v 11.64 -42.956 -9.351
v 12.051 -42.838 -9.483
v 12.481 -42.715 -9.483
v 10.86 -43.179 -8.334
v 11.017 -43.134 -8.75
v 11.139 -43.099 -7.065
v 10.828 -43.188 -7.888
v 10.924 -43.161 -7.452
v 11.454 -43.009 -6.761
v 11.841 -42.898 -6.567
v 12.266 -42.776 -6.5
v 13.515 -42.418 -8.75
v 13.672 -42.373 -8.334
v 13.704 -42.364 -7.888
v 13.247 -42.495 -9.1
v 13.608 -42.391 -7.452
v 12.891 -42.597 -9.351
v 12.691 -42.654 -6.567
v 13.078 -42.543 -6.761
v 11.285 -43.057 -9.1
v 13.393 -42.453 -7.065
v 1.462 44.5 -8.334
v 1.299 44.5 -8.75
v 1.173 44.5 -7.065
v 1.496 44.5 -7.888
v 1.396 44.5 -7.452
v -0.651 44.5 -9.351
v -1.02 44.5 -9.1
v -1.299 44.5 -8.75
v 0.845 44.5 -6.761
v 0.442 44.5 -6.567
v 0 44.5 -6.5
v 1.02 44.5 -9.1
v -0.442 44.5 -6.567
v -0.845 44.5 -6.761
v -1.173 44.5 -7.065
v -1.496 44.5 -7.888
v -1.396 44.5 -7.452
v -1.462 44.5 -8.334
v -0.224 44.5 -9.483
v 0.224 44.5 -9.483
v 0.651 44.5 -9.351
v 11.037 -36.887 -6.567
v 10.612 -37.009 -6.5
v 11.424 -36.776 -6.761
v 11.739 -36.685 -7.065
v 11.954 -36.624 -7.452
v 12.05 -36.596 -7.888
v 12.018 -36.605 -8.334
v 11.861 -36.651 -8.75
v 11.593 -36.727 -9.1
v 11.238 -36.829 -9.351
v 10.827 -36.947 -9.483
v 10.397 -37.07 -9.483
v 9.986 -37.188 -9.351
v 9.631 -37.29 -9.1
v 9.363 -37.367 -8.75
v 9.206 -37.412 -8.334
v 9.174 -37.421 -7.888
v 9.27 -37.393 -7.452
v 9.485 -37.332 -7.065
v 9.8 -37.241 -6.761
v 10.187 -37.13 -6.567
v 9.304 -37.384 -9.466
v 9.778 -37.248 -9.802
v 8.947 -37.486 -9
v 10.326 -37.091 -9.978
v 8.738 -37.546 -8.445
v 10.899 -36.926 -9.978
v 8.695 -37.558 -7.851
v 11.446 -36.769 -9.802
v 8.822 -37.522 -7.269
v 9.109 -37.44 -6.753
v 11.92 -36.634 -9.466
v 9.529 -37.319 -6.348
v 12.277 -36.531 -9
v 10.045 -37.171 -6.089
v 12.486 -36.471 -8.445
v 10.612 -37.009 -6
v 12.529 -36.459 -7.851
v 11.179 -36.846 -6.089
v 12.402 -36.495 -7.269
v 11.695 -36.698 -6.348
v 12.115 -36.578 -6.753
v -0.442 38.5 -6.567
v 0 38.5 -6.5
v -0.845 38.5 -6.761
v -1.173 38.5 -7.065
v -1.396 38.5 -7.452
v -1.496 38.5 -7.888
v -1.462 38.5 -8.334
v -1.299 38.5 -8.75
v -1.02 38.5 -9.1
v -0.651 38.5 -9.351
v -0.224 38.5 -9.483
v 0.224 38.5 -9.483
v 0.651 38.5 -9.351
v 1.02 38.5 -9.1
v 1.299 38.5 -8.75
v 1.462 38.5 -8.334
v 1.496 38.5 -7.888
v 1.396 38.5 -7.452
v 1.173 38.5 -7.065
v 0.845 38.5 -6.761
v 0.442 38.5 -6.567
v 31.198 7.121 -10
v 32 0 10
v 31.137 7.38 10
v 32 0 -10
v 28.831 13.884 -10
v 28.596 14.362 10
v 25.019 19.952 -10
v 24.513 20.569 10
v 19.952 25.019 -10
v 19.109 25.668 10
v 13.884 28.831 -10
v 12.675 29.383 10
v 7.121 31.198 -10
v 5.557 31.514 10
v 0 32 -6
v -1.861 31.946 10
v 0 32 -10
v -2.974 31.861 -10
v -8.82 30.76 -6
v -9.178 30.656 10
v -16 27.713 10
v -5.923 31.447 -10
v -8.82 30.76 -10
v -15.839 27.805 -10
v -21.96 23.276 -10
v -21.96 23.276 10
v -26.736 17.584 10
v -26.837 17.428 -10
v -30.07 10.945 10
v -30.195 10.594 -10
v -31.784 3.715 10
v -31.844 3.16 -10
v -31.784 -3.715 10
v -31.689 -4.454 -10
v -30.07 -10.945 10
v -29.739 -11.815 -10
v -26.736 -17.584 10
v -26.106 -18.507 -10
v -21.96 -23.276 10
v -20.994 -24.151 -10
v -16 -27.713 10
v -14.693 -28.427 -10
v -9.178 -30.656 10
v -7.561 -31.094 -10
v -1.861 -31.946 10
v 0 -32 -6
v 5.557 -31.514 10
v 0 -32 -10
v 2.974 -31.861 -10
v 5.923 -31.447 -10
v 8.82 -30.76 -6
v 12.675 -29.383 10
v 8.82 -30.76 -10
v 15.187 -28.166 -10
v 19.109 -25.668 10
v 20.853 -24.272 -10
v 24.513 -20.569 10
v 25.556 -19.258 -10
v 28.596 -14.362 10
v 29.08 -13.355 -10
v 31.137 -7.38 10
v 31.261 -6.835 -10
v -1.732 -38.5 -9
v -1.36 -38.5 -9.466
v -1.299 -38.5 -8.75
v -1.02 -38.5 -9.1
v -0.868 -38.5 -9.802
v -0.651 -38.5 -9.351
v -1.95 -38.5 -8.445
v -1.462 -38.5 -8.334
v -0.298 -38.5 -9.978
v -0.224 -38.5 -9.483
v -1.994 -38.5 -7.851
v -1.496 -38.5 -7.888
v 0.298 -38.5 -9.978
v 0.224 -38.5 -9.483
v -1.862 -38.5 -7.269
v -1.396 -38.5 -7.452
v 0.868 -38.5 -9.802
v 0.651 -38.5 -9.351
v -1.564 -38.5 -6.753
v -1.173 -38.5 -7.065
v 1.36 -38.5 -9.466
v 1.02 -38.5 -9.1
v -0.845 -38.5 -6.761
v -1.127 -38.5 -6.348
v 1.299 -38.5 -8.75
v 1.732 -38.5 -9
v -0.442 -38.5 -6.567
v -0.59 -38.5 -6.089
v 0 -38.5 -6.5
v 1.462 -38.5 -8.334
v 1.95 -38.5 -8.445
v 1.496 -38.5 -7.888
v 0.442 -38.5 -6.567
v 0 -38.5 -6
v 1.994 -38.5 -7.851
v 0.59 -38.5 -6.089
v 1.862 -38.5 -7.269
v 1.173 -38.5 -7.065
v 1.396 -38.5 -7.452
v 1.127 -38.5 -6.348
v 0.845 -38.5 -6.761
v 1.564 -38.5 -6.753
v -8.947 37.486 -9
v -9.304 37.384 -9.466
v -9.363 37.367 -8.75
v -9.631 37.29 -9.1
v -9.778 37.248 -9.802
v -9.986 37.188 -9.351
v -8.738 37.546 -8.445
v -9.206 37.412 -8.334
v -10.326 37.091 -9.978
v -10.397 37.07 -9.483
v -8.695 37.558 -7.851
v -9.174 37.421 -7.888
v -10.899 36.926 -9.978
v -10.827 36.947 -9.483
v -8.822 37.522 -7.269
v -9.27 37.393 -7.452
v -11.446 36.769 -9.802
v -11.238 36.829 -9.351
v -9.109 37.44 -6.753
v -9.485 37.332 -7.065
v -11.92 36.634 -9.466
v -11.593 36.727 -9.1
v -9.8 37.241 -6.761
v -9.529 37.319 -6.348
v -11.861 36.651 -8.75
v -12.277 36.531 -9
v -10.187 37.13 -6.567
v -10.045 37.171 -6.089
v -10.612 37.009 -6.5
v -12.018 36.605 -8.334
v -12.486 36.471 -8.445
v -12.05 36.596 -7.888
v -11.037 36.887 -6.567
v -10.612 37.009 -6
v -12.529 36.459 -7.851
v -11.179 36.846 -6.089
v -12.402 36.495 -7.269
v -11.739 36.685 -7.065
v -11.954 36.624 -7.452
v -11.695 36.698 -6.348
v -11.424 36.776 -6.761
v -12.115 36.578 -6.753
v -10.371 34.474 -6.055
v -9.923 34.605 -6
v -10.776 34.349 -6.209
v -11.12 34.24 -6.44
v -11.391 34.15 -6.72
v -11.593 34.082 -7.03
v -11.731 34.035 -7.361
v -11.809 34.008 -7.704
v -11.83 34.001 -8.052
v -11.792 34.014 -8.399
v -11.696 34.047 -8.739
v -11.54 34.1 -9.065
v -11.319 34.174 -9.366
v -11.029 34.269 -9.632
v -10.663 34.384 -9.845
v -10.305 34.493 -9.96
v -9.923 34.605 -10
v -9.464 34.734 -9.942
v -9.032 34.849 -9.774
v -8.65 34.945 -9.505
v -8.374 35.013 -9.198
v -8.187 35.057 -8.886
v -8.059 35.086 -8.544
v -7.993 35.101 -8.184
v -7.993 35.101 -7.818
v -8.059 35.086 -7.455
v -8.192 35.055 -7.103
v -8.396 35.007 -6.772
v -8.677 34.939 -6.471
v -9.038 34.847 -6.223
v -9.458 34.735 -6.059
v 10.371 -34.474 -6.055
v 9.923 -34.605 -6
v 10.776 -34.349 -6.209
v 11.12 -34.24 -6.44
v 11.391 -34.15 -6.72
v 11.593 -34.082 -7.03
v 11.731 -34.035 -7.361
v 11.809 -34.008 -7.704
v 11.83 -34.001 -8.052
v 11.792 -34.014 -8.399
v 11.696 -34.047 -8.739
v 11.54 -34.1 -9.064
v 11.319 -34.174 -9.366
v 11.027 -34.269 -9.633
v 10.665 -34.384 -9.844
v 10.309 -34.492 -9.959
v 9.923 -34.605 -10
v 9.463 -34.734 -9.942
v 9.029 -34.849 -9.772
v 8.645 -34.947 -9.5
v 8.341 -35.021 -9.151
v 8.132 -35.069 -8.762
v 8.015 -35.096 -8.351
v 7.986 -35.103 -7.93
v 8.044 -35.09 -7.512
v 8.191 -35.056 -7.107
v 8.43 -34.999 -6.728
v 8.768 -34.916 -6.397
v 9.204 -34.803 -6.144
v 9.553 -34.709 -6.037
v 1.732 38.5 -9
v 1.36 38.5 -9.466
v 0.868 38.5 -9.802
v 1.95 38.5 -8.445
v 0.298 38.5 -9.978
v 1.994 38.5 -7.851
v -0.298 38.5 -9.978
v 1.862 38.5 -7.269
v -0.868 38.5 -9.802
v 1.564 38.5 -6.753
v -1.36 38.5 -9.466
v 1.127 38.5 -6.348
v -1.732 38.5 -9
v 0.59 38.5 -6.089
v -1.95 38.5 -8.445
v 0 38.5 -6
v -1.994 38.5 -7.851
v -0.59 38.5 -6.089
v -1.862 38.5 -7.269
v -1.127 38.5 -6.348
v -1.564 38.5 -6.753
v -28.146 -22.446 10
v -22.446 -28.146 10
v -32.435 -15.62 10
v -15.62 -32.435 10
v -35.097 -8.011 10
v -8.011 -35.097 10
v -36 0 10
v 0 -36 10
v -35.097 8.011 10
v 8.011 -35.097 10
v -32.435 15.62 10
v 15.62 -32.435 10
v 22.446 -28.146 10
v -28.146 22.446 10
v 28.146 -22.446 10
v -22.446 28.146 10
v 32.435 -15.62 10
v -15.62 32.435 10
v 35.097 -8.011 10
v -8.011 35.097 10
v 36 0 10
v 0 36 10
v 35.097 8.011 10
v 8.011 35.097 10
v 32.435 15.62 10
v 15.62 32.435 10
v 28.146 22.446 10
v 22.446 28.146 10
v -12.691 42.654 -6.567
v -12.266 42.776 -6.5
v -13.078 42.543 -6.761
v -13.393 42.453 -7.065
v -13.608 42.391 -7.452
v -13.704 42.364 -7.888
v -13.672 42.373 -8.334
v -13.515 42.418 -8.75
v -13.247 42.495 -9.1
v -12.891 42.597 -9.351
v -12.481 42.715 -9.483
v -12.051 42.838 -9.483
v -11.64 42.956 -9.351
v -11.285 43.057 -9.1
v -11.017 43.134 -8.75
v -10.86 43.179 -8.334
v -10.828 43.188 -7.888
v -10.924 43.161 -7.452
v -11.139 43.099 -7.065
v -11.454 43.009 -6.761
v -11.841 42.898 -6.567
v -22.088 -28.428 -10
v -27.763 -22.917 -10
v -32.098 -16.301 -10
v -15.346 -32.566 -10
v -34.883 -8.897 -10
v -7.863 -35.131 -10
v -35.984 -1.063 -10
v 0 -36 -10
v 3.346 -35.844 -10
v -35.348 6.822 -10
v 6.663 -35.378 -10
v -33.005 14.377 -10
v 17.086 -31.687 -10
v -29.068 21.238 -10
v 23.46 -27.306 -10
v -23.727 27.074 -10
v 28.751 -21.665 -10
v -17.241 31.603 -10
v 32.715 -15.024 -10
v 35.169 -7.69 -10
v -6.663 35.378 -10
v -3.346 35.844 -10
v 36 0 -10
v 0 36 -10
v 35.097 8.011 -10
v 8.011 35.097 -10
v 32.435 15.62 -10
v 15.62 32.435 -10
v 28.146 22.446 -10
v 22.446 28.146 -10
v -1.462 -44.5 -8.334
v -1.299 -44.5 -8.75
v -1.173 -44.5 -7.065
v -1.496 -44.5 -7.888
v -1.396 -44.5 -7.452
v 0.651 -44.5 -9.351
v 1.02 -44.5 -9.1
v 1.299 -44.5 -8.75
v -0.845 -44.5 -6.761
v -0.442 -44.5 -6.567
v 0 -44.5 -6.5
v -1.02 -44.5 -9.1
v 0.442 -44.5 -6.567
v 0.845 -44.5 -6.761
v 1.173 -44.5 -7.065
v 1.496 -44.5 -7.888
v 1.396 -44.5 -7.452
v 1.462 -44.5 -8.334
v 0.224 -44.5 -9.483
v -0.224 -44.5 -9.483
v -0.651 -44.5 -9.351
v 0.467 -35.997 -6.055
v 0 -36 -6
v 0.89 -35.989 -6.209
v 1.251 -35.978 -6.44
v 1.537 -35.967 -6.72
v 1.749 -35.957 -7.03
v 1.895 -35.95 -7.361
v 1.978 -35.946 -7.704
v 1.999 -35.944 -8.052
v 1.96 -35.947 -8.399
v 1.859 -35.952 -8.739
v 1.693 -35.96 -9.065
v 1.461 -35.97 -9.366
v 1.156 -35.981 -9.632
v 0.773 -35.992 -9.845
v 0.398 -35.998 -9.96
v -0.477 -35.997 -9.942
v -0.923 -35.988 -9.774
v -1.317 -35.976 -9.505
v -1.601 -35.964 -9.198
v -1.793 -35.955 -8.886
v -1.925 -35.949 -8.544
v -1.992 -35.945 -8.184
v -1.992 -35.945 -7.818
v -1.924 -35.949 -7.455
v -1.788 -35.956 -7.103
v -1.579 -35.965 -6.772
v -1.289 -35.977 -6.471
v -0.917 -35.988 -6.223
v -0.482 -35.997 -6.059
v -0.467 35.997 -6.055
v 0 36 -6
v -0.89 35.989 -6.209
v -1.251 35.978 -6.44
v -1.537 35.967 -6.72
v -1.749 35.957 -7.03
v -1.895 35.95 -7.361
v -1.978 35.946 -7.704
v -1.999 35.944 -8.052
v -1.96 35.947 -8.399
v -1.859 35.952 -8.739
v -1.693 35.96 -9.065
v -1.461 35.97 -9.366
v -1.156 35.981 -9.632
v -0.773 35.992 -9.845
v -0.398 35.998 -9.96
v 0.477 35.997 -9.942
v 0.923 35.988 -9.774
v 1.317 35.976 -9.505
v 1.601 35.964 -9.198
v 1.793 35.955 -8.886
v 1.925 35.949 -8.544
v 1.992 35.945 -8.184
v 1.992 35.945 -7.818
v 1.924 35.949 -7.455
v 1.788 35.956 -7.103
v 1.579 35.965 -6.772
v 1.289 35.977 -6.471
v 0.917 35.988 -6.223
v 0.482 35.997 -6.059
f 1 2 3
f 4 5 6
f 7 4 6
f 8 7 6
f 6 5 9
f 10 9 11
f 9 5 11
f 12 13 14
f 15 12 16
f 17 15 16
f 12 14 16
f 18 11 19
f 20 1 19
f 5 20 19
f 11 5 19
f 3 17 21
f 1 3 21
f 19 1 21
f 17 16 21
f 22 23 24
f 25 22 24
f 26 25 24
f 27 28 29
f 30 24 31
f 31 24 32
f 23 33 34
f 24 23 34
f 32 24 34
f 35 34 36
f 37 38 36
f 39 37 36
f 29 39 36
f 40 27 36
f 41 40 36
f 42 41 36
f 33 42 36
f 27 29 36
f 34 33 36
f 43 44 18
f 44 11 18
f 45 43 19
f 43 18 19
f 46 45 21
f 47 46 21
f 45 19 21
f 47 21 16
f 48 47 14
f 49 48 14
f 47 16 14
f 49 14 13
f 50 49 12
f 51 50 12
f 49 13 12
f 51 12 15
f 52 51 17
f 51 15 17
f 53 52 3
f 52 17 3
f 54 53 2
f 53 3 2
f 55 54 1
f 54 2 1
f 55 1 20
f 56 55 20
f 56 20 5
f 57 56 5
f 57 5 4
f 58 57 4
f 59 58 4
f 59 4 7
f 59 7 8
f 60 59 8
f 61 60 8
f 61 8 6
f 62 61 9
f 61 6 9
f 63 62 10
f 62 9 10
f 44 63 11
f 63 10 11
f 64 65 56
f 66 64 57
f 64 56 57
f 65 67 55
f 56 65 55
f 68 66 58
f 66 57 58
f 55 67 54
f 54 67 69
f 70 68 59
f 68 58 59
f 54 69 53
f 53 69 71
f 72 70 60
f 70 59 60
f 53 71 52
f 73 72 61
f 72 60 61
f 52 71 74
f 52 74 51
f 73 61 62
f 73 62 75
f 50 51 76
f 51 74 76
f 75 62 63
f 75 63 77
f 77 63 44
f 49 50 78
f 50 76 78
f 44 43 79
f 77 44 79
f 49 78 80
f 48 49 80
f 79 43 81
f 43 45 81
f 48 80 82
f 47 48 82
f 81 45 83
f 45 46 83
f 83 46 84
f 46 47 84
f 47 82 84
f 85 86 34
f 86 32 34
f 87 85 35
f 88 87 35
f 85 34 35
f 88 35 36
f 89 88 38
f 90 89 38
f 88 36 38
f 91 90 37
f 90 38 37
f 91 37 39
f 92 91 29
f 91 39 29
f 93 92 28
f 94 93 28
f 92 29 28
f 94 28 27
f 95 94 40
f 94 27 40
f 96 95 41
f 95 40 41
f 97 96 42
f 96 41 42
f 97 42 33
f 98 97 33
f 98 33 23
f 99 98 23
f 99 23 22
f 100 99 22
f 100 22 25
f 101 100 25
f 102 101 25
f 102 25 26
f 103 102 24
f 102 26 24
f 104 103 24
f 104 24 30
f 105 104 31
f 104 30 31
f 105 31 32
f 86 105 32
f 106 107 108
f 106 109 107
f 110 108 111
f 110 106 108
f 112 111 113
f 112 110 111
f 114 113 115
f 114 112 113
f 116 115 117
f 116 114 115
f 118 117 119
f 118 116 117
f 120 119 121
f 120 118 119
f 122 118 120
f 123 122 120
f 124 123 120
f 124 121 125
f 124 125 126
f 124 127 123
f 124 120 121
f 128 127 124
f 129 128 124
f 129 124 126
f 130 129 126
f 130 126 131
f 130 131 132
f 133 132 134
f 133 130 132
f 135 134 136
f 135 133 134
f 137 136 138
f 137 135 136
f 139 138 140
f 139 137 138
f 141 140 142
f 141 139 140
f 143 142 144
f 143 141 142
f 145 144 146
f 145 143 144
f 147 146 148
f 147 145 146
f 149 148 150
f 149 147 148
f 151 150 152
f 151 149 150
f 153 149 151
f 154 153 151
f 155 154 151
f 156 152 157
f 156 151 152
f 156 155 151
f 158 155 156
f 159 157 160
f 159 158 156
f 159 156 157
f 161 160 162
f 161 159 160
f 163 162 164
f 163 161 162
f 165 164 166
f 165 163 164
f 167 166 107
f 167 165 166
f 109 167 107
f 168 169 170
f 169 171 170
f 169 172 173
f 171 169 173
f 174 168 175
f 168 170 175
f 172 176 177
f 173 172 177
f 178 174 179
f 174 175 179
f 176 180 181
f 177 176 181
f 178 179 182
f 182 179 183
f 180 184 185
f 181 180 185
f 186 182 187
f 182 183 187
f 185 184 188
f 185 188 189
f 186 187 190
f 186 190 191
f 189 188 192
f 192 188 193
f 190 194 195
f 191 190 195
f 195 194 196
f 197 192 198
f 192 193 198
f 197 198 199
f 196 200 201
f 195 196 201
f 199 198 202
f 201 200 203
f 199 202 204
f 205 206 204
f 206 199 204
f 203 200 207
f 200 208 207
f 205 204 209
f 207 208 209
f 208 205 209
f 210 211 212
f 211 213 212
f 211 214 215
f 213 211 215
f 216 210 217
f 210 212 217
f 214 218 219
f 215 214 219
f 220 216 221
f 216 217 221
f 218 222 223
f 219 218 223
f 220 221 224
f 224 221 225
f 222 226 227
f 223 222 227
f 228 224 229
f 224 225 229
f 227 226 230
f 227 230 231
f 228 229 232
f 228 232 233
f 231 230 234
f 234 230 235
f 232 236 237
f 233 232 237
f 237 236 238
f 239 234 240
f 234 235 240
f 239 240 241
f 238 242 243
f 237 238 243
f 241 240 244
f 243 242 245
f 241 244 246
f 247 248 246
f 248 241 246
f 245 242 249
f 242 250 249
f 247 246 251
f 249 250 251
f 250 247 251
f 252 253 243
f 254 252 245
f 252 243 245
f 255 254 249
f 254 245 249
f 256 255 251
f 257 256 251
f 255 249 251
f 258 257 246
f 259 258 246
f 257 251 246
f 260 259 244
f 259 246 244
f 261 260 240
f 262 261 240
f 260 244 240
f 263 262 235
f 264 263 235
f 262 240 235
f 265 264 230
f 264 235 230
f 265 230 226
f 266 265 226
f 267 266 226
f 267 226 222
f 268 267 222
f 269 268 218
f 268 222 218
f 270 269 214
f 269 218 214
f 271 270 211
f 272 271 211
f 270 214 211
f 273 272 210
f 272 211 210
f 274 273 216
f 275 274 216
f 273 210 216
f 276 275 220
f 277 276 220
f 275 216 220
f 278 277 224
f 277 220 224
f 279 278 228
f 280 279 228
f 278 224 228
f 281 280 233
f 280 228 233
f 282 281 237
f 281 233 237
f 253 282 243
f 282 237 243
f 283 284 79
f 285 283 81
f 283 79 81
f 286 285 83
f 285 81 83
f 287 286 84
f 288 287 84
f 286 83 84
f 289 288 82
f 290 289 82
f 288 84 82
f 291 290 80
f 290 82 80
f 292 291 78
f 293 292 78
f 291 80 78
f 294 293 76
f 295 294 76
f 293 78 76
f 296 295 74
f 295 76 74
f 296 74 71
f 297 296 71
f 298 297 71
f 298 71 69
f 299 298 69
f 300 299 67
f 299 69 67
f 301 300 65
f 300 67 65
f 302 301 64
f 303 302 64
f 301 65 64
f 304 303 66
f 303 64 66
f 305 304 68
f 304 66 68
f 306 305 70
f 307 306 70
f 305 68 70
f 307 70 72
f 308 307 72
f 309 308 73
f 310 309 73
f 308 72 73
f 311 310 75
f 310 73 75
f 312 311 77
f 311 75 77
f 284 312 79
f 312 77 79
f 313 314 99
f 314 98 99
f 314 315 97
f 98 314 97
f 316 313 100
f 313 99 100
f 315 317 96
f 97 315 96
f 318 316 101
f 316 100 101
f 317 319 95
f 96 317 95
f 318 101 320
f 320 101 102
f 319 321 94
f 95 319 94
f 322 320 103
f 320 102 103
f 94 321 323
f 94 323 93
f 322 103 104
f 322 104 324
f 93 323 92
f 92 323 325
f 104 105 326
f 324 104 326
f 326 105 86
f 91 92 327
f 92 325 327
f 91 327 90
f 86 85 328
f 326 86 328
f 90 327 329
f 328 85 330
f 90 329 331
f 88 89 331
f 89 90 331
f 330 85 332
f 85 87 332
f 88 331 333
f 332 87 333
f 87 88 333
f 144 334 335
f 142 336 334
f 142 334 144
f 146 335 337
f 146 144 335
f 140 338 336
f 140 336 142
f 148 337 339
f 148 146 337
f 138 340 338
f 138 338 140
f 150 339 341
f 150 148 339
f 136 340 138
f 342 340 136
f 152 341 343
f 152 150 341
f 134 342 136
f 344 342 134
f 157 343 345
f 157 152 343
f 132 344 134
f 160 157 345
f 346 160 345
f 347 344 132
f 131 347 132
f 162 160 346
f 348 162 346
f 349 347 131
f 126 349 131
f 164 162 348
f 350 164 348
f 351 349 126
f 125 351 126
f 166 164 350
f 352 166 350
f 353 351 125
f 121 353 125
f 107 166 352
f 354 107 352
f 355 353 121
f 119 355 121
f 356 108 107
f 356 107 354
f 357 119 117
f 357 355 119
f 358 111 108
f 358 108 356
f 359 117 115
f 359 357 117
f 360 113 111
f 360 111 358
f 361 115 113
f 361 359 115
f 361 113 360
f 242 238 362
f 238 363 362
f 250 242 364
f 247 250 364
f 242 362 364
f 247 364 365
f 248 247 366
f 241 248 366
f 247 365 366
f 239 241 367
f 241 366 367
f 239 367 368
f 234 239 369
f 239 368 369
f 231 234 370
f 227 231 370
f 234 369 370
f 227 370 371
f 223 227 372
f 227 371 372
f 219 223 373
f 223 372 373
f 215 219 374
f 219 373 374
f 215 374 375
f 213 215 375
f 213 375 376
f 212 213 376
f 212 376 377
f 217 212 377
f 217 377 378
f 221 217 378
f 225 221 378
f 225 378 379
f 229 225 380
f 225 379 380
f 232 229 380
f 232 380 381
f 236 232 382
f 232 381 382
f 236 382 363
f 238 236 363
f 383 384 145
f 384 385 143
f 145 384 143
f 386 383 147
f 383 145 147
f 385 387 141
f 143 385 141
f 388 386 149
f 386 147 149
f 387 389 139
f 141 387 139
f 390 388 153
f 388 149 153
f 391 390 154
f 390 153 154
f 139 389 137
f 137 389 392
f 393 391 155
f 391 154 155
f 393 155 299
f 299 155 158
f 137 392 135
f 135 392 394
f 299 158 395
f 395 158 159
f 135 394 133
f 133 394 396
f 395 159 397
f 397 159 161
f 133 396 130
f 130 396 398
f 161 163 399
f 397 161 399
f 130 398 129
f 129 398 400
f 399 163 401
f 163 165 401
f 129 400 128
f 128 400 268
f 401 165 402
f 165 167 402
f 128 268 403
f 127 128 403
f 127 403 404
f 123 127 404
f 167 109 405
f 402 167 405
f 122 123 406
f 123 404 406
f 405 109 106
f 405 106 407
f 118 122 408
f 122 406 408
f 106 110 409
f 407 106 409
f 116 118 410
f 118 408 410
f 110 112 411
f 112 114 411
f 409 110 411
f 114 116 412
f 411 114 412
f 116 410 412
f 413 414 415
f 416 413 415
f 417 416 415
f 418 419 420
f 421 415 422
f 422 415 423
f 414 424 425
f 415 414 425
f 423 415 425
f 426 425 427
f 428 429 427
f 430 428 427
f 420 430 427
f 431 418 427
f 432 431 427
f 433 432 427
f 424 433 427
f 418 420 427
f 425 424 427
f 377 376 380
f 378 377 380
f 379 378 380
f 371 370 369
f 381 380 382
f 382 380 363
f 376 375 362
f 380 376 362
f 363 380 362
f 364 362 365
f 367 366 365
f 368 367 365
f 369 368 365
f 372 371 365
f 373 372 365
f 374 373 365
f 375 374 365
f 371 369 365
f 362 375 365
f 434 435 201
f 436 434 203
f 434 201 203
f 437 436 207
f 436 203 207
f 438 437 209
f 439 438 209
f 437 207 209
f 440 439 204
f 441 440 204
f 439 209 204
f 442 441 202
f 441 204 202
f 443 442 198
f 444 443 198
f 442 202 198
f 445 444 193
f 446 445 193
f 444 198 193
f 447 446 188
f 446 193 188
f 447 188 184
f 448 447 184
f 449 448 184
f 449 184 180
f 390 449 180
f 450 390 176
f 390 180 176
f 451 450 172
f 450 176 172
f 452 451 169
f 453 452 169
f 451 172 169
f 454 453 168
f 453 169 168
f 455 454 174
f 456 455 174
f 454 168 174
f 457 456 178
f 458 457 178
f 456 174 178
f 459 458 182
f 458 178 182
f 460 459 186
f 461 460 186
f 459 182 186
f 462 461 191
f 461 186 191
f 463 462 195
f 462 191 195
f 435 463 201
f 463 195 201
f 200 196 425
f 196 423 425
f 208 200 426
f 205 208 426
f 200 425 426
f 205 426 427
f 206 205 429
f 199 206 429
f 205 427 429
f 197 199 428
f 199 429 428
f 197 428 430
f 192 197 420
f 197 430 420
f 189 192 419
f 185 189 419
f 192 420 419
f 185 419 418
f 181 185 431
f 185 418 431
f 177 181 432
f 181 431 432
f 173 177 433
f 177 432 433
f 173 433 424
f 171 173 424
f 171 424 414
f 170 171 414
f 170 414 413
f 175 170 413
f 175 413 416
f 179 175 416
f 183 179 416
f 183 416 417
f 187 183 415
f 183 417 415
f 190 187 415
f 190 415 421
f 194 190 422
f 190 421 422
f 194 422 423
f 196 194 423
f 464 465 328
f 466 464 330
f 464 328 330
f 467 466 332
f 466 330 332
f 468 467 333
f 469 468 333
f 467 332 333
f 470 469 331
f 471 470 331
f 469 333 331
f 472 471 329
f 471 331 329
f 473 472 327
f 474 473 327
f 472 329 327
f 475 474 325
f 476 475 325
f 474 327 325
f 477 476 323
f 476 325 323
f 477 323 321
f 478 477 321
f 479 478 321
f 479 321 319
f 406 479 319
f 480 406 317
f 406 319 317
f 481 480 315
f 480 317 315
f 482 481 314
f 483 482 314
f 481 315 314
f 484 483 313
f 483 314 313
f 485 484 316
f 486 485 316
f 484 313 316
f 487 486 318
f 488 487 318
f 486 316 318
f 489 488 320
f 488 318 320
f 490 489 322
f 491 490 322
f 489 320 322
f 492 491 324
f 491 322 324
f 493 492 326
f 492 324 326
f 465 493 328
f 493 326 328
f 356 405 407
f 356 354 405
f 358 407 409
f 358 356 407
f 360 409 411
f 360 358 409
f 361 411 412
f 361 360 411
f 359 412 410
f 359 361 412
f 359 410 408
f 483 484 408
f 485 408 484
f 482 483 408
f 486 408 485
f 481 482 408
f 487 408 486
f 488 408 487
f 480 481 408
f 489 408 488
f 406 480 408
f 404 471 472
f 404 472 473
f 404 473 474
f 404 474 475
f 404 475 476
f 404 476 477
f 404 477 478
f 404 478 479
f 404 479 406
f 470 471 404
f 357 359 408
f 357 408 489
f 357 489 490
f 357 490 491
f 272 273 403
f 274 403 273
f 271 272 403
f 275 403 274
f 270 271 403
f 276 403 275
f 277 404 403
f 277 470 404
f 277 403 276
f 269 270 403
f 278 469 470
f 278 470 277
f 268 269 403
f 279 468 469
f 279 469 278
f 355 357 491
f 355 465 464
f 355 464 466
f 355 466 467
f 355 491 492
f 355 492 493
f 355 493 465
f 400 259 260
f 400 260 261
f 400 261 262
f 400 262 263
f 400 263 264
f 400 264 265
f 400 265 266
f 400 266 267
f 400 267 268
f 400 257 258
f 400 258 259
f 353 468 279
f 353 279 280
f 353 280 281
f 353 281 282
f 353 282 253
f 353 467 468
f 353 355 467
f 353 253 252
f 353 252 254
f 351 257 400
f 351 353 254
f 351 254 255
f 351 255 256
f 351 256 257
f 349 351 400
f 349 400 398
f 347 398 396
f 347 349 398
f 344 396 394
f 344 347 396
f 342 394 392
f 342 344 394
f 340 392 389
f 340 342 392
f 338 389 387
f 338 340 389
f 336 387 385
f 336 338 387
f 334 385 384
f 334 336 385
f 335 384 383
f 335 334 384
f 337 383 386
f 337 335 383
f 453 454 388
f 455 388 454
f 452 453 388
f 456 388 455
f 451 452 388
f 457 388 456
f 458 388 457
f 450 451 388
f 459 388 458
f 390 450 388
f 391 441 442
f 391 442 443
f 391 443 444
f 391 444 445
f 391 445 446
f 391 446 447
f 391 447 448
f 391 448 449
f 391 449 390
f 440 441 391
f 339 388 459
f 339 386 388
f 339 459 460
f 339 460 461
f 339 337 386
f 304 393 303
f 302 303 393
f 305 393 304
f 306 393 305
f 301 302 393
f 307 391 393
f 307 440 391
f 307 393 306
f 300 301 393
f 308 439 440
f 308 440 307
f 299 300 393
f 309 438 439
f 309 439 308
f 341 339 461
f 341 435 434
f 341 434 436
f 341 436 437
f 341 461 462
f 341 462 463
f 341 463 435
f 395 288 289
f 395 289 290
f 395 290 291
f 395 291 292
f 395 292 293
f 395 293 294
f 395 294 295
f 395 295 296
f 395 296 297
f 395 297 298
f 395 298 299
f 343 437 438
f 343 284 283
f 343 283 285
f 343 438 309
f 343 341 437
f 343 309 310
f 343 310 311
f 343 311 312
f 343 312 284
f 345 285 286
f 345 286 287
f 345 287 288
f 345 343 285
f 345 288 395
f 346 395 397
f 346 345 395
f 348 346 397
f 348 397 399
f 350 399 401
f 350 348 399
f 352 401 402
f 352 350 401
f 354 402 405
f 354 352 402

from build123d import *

# Parameters (mm, degrees)
SKETCH1_R           = 36
SKETCH1_R_2         = 32
BOSS_EXTRUDE1_DEPTH = 10
CIRPATTERN1_COUNT   = 2
CIRPATTERN1_ANGLE   = 16
CIRPATTERN2_COUNT   = 2


with BuildPart() as part:
    # Sketch1 → Boss-Extrude1 (new, symmetric)
    with BuildSketch(Plane.XY):
        Circle(SKETCH1_R)
        Circle(SKETCH1_R_2, mode=Mode.SUBTRACT)
    extrude(amount=BOSS_EXTRUDE1_DEPTH, both=True)

    # Sketch5 → Revolve1 (revolve)
    with BuildSketch(Plane(origin=(0, 0, 0), x_dir=(0, 0, -1), z_dir=(1, 0, 0))):
        Polygon((6, 32), (6, 38.5), (6.5, 38.5), (6.5, 44.5), (8, 44.5), (8, 32), align=None)
    revolve1 = revolve(axis=Axis((0, 44.5, -8), (0, -1, 0)))

    # CirPattern1: Revolve1 ×2 about axis
    cirpattern1_axis = Axis((0, 0, 10), (0, 0, 1))
    for i in range(1, CIRPATTERN1_COUNT):
        add(revolve1.rotate(cirpattern1_axis, i * CIRPATTERN1_ANGLE / (CIRPATTERN1_COUNT - 1)))

    # CirPattern2: Revolve1 ×2 about axis
    cirpattern2_axis = Axis((0, 0, 10), (0, 0, -1))
    for i in range(1, CIRPATTERN2_COUNT):
        add(revolve1.rotate(cirpattern2_axis, i * 360 / CIRPATTERN2_COUNT))

    # CirPattern2 copy 1 sketch → CirPattern2 copy 1 (revolve)
    with BuildSketch(Plane(origin=(0, 0, 0), x_dir=(0, 0, -1), z_dir=(-0.9612616959383187, -0.2756373558169999, 0))):
        Polygon((6, 32), (6, 38.5), (6.5, 38.5), (6.5, 44.5), (8, 44.5), (8, 32), align=None)
    revolve(axis=Axis((12.265862334, -42.776145469, -8), (-0.2756373558169999, 0.9612616959383187, 0)))


solid = part.part
